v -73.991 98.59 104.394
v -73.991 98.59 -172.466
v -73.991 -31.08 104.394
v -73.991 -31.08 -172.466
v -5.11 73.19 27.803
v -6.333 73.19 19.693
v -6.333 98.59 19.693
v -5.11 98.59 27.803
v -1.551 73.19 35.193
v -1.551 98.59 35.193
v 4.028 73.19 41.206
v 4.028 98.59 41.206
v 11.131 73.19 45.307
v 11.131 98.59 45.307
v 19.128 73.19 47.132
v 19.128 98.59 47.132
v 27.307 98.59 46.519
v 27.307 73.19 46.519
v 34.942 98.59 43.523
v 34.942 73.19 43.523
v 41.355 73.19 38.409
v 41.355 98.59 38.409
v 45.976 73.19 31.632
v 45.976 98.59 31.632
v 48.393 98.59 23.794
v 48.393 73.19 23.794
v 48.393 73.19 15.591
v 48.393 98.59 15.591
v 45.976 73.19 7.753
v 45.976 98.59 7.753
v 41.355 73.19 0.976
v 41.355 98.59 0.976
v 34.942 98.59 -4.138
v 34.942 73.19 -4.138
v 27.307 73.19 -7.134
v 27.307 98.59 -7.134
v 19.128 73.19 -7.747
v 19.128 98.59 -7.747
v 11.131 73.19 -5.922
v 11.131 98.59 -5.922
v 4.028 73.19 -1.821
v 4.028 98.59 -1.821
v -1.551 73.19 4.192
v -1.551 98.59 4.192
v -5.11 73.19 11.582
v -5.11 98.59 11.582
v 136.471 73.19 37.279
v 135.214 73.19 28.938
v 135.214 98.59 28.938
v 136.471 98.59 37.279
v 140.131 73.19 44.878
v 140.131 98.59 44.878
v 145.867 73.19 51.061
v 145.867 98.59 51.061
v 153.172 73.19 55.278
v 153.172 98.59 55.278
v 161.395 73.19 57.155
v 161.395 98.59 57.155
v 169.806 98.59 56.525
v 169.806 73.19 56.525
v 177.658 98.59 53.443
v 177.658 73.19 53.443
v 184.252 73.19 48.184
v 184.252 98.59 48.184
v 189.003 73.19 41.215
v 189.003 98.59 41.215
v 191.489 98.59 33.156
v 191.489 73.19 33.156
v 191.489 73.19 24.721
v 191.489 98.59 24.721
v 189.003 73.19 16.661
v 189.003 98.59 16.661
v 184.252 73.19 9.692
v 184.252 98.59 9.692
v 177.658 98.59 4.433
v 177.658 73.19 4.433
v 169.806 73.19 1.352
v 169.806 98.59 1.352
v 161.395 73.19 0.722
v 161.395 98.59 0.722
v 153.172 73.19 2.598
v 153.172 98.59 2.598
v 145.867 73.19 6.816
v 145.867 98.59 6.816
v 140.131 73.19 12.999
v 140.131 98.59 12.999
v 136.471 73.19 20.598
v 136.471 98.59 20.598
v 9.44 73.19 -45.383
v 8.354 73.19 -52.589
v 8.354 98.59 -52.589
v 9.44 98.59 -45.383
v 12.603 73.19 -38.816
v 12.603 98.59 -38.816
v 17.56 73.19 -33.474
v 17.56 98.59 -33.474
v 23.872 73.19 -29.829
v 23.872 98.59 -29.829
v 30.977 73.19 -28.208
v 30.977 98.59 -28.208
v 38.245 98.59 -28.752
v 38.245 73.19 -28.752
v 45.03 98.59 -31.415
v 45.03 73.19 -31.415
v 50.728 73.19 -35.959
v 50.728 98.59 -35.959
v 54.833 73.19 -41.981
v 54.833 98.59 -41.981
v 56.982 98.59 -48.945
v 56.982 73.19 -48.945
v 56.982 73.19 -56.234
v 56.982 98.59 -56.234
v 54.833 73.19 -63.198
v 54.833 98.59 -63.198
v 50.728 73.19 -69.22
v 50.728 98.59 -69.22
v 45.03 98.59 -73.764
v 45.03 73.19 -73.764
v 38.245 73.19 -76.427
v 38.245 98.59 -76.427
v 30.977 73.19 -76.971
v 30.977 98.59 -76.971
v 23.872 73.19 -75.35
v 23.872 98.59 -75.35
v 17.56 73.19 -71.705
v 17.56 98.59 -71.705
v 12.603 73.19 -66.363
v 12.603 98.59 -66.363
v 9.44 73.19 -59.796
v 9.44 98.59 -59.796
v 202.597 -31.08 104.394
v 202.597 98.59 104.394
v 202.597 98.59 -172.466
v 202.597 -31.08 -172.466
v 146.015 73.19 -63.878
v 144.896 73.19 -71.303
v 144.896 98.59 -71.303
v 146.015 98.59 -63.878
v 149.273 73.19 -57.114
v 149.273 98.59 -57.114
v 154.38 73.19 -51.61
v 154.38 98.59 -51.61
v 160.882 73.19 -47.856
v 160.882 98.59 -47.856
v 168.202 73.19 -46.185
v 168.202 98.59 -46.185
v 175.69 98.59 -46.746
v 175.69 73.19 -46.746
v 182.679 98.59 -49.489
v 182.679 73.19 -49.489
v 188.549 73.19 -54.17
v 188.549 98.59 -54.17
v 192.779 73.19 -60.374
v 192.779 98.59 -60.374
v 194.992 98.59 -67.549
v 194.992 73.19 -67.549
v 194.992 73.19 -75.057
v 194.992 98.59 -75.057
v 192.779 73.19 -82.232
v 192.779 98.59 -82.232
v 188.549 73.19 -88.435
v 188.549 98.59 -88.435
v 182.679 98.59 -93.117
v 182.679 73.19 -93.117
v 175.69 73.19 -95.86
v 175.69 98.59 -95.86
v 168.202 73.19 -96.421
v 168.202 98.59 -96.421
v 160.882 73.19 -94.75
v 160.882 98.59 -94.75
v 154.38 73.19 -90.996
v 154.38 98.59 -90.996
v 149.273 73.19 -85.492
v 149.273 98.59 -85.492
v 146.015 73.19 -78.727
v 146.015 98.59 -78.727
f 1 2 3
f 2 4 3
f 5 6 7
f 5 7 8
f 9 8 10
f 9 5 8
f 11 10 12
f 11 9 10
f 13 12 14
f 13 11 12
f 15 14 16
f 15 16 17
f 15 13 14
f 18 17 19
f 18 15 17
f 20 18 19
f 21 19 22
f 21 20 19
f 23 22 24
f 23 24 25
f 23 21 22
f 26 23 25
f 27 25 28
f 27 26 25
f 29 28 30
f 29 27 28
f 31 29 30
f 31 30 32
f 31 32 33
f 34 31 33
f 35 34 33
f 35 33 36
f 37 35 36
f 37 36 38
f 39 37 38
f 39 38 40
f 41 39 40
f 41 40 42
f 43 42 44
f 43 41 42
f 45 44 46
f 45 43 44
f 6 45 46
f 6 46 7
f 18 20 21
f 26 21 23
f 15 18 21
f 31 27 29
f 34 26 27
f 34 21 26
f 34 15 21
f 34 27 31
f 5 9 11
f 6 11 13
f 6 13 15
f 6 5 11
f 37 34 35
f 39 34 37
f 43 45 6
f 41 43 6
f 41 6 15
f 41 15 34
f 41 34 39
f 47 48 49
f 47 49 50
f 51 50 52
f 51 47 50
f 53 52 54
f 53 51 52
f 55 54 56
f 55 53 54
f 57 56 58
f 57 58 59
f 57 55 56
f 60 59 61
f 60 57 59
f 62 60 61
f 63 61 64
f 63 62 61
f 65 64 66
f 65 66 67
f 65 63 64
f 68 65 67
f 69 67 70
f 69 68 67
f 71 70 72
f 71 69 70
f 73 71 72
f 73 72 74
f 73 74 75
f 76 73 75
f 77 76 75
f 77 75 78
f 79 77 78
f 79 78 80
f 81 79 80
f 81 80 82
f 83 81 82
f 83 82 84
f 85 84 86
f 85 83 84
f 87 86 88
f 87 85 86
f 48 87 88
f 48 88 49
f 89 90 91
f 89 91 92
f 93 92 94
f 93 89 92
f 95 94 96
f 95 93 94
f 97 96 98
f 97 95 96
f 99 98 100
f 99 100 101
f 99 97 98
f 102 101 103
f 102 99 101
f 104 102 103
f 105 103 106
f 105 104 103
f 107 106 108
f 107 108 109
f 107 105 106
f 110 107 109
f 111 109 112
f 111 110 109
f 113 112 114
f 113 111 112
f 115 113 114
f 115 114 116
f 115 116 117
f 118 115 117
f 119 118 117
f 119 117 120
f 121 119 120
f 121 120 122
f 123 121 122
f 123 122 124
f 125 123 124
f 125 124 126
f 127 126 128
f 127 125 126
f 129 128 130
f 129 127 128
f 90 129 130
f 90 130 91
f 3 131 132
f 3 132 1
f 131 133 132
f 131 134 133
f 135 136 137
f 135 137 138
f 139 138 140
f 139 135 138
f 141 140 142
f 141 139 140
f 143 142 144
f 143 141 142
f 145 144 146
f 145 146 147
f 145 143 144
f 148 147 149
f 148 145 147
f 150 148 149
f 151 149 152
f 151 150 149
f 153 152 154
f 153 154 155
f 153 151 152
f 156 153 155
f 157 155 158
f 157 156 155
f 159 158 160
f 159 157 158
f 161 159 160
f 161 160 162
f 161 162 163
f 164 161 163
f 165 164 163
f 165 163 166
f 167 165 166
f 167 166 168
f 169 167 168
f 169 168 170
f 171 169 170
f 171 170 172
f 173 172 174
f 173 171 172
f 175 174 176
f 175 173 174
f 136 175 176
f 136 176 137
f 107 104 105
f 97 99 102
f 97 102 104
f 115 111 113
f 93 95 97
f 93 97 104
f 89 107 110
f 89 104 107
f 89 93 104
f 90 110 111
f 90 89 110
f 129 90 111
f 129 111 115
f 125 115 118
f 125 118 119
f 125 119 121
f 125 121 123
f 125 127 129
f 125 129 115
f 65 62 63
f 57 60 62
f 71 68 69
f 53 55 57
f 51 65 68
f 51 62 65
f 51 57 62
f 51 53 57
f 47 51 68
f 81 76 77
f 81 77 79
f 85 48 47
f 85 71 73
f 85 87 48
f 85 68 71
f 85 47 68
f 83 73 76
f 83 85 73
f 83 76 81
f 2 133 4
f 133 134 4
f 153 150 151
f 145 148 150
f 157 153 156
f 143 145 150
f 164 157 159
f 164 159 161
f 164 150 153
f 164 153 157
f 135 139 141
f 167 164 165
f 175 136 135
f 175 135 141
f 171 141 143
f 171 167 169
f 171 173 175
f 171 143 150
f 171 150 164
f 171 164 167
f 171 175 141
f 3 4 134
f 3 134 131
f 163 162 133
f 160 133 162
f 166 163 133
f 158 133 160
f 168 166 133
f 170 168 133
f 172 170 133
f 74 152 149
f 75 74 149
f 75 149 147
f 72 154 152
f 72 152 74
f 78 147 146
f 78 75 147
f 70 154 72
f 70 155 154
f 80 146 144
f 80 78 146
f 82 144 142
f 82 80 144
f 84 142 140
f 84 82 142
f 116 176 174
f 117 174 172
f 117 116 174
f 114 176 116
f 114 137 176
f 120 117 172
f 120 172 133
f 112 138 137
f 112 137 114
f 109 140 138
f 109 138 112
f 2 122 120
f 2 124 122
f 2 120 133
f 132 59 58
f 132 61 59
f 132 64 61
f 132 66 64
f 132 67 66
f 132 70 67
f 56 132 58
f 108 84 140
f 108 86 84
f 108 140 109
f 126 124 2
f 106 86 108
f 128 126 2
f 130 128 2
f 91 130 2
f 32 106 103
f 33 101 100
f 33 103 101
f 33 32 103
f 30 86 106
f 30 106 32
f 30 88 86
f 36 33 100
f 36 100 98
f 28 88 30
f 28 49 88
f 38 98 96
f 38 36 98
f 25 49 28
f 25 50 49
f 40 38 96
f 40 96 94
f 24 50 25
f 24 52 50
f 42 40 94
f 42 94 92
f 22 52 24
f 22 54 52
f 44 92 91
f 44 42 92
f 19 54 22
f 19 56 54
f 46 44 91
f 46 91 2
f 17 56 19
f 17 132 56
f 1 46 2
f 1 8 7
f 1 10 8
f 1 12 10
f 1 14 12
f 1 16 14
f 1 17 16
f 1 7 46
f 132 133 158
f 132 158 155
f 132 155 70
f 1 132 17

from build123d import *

# Parameters (mm, degrees)
F0_W     = 144.507817924
F0_H     = 104.2701918632
F1_DEPTH = 104.394
F2_DEPTH = 276.86
F3_DEPTH = 132.08
F4_W     = 276.587817924
F4_H     = 276.86
F4_R     = 25.1884721884
F4_R_2   = 24.4502004905
F4_R_3   = 28.2958784433
F4_R_4   = 27.5167719558
F5_DEPTH = 25.4


with BuildPart() as f1:
    # F0 (on Top) → F1 (new body)
    with BuildSketch(Plane.XY):
        with Locations((-1.7366670072, 21.054728888)):
            Rectangle(F0_W, F0_H)
    extrude(amount=F1_DEPTH)

    # F2 (add): a face of the model
    f2_faces = [f1.faces().sort_by_distance(p)[0] for p in [
        (-1.7366670072, 21.054728888, 104.394),
    ]]
    extrude(f2_faces, amount=-F2_DEPTH)

    # F3 (add): a face of the model
    f3_faces = [f1.faces().sort_by_distance(p)[0] for p in [
        (70.5172419548, 21.054728888, -34.036),
    ]]
    extrude(f3_faces, amount=F3_DEPTH)

    # F4 (on face) → F5 (join)
    with BuildSketch(Plane(origin=(0, 73.1898248196, 0), x_dir=(-1, 0, 0), z_dir=(0, 1, 0))):
        with Locations((-64.3033329928, -34.036)):
            Rectangle(F4_W, F4_H)
        with Locations((-170.0846999884, -71.3028535247)):
            Circle(F4_R, mode=Mode.SUBTRACT)
        with Locations((-32.8044444323, -52.5894537568)):
            Circle(F4_R_2, mode=Mode.SUBTRACT)
        with Locations((-163.5096520185, 28.9383083582)):
            Circle(F4_R_3, mode=Mode.SUBTRACT)
        with Locations((-21.1840029806, 19.6925438941)):
            Circle(F4_R_4, mode=Mode.SUBTRACT)
    extrude(amount=F5_DEPTH)


solid = f1.part
